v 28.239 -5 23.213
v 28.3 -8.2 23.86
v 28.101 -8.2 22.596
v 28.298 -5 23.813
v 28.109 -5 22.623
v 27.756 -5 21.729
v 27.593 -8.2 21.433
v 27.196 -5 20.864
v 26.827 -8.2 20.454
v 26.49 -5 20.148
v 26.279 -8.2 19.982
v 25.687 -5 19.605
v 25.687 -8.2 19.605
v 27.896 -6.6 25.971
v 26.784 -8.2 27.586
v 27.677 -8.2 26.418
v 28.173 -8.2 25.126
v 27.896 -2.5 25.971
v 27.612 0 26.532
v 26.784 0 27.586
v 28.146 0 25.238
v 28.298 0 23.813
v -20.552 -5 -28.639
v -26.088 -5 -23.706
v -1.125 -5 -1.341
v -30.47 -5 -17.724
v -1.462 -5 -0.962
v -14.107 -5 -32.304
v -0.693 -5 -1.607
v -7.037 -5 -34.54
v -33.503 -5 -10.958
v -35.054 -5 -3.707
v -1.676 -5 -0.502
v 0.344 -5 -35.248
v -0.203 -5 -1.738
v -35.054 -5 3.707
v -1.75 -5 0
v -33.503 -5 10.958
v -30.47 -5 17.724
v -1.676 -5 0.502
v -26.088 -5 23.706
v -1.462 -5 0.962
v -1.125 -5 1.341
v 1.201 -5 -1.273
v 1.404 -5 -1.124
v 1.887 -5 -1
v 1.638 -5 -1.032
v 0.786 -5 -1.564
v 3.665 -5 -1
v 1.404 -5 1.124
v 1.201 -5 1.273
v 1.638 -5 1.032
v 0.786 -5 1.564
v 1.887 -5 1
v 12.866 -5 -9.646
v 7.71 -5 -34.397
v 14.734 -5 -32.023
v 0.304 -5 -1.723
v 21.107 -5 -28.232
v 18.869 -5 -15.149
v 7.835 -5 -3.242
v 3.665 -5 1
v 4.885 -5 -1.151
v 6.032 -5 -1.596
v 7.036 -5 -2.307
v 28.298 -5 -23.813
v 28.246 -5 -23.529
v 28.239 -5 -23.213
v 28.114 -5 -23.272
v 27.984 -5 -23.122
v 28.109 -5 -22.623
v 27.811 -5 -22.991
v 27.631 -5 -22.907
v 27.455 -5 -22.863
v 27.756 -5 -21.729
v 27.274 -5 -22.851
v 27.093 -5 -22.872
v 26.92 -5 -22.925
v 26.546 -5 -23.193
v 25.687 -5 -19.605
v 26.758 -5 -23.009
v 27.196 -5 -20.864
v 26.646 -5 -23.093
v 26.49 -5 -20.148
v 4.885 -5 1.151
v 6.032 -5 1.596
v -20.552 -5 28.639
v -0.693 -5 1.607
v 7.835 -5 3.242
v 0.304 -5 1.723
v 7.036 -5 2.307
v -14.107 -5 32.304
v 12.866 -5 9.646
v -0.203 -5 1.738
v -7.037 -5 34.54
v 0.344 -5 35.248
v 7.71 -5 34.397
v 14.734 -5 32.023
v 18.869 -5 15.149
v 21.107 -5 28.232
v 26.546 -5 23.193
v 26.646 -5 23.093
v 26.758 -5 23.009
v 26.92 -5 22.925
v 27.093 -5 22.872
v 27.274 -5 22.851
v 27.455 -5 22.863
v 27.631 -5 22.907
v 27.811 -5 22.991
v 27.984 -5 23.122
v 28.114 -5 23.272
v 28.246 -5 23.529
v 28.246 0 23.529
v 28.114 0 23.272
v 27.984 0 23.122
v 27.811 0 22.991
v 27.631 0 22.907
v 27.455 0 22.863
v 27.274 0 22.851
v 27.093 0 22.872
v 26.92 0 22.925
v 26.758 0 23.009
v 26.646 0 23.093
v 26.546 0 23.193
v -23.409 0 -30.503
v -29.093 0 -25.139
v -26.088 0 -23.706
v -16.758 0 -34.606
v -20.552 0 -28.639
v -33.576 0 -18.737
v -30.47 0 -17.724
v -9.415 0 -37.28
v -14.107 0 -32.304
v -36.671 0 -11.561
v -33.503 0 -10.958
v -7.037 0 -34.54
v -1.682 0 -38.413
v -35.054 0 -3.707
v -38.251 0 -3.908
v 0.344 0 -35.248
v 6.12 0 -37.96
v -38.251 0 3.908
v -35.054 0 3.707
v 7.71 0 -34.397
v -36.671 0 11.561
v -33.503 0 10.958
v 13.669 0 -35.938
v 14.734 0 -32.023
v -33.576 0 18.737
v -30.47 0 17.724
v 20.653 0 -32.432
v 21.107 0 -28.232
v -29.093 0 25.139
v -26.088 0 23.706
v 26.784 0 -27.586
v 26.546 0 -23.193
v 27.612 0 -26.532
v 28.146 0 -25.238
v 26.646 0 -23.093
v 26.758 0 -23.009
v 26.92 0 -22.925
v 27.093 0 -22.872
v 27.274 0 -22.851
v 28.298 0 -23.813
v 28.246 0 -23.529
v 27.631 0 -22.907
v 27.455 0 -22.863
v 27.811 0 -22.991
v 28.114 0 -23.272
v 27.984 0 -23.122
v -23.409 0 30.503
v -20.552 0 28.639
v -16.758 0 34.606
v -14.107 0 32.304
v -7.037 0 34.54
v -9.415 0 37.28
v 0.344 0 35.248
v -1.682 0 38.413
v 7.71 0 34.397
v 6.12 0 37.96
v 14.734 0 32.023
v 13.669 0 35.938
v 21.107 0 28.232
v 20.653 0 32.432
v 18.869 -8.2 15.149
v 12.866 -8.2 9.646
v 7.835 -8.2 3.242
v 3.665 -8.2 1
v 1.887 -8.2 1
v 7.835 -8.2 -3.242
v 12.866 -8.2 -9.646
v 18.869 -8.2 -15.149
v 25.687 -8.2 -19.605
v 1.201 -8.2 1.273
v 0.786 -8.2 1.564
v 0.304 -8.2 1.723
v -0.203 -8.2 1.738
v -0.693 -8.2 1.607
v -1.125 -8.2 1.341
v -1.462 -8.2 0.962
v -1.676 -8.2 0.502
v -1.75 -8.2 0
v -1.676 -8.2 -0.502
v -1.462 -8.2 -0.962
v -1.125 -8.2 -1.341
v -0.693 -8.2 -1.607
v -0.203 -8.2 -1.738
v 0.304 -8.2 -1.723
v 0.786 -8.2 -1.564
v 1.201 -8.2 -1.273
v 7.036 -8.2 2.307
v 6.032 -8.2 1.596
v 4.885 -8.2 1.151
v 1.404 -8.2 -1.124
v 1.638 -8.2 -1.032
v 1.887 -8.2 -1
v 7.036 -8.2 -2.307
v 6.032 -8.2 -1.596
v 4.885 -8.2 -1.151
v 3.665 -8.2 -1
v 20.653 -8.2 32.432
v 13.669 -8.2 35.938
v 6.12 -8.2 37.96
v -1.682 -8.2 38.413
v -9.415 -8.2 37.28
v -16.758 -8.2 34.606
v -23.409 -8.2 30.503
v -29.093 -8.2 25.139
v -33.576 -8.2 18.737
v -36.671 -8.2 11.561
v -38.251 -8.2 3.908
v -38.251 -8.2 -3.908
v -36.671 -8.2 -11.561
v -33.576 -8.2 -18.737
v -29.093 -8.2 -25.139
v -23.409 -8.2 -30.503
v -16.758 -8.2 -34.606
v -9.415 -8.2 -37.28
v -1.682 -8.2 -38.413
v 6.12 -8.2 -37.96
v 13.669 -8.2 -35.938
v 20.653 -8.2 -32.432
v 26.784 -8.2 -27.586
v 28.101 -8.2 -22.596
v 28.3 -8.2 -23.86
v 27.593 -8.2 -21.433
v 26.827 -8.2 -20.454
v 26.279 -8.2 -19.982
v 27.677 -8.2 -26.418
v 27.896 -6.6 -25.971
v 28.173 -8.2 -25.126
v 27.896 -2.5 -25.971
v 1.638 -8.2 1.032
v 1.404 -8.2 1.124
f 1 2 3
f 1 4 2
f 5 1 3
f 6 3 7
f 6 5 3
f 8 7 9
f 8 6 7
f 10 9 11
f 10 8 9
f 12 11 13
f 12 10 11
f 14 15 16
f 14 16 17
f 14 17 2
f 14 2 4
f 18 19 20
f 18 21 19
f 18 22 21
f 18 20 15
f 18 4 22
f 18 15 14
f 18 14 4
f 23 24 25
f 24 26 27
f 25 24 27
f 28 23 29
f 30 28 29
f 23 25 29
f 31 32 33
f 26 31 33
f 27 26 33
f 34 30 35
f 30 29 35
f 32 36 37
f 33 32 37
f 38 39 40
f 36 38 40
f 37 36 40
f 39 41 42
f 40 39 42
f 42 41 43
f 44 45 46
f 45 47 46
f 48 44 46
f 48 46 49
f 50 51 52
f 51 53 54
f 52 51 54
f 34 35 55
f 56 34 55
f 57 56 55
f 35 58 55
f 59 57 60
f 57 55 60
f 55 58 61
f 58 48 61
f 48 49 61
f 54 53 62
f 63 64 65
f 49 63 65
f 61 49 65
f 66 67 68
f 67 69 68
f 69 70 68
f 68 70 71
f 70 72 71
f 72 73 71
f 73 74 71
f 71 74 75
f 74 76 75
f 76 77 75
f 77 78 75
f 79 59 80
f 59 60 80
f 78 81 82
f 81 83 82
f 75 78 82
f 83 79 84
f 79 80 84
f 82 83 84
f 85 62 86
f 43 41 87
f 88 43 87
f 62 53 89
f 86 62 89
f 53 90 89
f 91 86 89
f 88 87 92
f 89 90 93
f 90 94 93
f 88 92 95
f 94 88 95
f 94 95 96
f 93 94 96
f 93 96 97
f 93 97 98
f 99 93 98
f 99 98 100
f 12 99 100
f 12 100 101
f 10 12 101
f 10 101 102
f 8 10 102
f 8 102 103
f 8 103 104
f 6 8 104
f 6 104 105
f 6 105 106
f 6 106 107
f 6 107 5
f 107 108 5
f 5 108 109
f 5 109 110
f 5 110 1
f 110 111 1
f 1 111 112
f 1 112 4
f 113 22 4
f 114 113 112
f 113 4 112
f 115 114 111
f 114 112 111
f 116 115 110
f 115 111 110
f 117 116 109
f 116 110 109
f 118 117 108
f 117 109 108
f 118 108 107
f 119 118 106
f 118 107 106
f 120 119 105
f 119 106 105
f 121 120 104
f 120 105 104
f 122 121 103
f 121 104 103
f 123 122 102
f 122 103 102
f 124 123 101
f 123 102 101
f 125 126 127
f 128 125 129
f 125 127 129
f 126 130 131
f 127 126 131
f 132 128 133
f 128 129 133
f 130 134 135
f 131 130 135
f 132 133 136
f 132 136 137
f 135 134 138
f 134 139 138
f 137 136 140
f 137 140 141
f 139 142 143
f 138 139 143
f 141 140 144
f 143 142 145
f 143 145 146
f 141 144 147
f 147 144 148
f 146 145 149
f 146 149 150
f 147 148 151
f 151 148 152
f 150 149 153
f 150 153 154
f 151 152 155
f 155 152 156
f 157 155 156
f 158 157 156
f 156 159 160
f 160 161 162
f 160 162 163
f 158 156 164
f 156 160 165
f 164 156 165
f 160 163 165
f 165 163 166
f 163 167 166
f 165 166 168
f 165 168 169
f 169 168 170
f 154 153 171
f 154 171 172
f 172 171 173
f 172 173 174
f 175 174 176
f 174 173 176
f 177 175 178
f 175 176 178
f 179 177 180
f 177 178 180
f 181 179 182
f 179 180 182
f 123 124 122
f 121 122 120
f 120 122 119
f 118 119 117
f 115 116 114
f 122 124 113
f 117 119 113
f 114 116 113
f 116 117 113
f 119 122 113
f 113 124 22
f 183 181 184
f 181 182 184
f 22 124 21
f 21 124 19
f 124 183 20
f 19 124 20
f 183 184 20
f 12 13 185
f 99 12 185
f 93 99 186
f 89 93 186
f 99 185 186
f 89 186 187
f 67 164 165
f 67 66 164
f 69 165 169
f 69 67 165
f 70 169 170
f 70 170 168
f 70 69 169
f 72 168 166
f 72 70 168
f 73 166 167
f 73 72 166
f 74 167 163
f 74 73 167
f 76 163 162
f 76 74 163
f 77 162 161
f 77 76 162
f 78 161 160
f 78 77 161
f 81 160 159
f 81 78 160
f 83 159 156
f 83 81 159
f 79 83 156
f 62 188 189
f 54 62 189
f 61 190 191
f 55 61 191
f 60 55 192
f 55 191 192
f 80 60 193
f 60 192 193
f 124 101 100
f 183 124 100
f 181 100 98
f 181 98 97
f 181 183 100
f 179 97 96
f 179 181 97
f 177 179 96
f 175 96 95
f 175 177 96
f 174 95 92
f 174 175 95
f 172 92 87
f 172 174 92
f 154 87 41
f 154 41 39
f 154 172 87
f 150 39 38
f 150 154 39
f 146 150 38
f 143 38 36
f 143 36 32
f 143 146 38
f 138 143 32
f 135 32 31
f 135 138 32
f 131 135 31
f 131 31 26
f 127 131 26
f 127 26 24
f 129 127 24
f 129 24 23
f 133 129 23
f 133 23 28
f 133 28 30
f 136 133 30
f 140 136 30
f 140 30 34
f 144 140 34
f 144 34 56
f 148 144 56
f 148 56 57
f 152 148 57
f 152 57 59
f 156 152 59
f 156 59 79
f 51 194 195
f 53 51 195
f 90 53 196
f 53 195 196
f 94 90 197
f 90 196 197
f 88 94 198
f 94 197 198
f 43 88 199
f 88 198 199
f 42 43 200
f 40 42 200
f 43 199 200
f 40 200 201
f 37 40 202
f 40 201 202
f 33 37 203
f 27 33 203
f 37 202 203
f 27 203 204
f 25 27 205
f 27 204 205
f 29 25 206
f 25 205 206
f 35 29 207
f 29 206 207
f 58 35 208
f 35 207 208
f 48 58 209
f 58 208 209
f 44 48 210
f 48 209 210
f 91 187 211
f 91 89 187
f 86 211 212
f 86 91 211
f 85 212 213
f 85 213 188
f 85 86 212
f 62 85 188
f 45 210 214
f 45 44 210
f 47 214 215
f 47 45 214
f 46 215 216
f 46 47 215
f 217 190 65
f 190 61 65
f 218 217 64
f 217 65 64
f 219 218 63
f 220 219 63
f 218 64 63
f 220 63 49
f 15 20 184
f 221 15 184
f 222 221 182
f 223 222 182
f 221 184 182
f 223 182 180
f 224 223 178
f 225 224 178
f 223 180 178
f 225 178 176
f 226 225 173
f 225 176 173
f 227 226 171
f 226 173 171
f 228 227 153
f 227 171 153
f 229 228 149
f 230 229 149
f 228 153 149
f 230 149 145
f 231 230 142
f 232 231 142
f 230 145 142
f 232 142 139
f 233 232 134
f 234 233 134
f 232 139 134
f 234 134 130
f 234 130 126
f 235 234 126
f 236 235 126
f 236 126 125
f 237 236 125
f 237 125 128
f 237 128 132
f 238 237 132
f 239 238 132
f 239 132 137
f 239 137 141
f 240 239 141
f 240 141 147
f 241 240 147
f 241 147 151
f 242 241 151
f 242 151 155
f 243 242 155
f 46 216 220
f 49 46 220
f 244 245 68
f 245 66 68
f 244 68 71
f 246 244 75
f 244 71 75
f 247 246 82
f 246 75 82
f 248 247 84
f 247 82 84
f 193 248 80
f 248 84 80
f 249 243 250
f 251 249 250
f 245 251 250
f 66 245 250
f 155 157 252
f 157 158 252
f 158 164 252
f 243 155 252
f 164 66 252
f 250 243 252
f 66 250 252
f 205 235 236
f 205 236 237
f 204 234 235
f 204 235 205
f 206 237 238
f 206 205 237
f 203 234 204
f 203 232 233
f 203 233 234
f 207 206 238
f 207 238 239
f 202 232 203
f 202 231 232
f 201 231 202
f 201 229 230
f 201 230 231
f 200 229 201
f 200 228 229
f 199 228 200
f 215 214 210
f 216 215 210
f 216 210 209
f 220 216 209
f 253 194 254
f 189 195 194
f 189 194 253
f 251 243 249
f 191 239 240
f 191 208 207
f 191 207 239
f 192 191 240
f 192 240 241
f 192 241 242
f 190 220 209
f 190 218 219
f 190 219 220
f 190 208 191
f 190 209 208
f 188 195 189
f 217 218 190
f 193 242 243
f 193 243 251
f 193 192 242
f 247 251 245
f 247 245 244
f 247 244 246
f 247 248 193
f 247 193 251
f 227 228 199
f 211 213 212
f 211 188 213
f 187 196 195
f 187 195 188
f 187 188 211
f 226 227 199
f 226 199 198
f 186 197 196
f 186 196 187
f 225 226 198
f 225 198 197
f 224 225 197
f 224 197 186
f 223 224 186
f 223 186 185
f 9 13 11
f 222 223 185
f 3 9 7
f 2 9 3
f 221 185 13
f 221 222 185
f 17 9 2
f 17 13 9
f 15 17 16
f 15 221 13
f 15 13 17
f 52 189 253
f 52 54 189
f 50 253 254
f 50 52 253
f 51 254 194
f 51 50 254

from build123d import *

# Parameters (mm, degrees)
F0_R     = 38.45
F0_R_2   = 35.25
F1_DEPTH = 5
F2_R     = 38.45
F3_DEPTH = 3.2
F5_DEPTH = 25
F6_R     = 5
F7_R     = 1


with BuildPart() as f1:
    # F0 (on Front) → F1 (new body)
    with BuildSketch(Plane.XZ):
        Circle(F0_R)
        Circle(F0_R_2, mode=Mode.SUBTRACT)
    extrude(amount=F1_DEPTH)

    # F2 (on face) → F3 (join)
    with BuildSketch(Plane.XZ.offset(5)):
        Circle(F2_R)
    extrude(amount=F3_DEPTH)

    # F4 (on face) → F5 (cut)
    with BuildSketch(Plane.XZ.offset(8.2)):
        with BuildLine():
            Line((6.4361406616, 1), (1.4361406616, 1))
            ThreePointArc((1.4361406616, 1), (-1.75, 0), (1.4361406616, -1))
            Line((1.4361406616, -1), (6.4361406616, -1))
            ThreePointArc((6.4361406616, -1), (21.2635468628, -16.8975326234), (41.4361406616, -25))
            Line((41.4361406616, -25), (41.4361406616, 25))
            ThreePointArc((41.4361406616, 25), (21.2635468628, 16.8975326234), (6.4361406616, 1))
        make_face()
    extrude(amount=-F5_DEPTH, mode=Mode.SUBTRACT)

    # F6
    f6_edges = [f1.edges().sort_by_distance(p)[0] for p in [
        (31.364819, -4.1, 22.240743),
        (31.364819, -4.1, -22.240743),
        (6.436141, -6.6, -1),
        (6.436141, -6.6, 1),
    ]]
    fillet(f6_edges, radius=F6_R)

    # F7
    f7_edges = [f1.edges().sort_by_distance(p)[0] for p in [
        (1.436141, -6.6, 1),
        (1.436141, -6.6, -1),
        (27.756441, -2.5, 21.72884),
        (27.756441, -2.5, -21.72884),
    ]]
    fillet(f7_edges, radius=F7_R)


solid = f1.part
